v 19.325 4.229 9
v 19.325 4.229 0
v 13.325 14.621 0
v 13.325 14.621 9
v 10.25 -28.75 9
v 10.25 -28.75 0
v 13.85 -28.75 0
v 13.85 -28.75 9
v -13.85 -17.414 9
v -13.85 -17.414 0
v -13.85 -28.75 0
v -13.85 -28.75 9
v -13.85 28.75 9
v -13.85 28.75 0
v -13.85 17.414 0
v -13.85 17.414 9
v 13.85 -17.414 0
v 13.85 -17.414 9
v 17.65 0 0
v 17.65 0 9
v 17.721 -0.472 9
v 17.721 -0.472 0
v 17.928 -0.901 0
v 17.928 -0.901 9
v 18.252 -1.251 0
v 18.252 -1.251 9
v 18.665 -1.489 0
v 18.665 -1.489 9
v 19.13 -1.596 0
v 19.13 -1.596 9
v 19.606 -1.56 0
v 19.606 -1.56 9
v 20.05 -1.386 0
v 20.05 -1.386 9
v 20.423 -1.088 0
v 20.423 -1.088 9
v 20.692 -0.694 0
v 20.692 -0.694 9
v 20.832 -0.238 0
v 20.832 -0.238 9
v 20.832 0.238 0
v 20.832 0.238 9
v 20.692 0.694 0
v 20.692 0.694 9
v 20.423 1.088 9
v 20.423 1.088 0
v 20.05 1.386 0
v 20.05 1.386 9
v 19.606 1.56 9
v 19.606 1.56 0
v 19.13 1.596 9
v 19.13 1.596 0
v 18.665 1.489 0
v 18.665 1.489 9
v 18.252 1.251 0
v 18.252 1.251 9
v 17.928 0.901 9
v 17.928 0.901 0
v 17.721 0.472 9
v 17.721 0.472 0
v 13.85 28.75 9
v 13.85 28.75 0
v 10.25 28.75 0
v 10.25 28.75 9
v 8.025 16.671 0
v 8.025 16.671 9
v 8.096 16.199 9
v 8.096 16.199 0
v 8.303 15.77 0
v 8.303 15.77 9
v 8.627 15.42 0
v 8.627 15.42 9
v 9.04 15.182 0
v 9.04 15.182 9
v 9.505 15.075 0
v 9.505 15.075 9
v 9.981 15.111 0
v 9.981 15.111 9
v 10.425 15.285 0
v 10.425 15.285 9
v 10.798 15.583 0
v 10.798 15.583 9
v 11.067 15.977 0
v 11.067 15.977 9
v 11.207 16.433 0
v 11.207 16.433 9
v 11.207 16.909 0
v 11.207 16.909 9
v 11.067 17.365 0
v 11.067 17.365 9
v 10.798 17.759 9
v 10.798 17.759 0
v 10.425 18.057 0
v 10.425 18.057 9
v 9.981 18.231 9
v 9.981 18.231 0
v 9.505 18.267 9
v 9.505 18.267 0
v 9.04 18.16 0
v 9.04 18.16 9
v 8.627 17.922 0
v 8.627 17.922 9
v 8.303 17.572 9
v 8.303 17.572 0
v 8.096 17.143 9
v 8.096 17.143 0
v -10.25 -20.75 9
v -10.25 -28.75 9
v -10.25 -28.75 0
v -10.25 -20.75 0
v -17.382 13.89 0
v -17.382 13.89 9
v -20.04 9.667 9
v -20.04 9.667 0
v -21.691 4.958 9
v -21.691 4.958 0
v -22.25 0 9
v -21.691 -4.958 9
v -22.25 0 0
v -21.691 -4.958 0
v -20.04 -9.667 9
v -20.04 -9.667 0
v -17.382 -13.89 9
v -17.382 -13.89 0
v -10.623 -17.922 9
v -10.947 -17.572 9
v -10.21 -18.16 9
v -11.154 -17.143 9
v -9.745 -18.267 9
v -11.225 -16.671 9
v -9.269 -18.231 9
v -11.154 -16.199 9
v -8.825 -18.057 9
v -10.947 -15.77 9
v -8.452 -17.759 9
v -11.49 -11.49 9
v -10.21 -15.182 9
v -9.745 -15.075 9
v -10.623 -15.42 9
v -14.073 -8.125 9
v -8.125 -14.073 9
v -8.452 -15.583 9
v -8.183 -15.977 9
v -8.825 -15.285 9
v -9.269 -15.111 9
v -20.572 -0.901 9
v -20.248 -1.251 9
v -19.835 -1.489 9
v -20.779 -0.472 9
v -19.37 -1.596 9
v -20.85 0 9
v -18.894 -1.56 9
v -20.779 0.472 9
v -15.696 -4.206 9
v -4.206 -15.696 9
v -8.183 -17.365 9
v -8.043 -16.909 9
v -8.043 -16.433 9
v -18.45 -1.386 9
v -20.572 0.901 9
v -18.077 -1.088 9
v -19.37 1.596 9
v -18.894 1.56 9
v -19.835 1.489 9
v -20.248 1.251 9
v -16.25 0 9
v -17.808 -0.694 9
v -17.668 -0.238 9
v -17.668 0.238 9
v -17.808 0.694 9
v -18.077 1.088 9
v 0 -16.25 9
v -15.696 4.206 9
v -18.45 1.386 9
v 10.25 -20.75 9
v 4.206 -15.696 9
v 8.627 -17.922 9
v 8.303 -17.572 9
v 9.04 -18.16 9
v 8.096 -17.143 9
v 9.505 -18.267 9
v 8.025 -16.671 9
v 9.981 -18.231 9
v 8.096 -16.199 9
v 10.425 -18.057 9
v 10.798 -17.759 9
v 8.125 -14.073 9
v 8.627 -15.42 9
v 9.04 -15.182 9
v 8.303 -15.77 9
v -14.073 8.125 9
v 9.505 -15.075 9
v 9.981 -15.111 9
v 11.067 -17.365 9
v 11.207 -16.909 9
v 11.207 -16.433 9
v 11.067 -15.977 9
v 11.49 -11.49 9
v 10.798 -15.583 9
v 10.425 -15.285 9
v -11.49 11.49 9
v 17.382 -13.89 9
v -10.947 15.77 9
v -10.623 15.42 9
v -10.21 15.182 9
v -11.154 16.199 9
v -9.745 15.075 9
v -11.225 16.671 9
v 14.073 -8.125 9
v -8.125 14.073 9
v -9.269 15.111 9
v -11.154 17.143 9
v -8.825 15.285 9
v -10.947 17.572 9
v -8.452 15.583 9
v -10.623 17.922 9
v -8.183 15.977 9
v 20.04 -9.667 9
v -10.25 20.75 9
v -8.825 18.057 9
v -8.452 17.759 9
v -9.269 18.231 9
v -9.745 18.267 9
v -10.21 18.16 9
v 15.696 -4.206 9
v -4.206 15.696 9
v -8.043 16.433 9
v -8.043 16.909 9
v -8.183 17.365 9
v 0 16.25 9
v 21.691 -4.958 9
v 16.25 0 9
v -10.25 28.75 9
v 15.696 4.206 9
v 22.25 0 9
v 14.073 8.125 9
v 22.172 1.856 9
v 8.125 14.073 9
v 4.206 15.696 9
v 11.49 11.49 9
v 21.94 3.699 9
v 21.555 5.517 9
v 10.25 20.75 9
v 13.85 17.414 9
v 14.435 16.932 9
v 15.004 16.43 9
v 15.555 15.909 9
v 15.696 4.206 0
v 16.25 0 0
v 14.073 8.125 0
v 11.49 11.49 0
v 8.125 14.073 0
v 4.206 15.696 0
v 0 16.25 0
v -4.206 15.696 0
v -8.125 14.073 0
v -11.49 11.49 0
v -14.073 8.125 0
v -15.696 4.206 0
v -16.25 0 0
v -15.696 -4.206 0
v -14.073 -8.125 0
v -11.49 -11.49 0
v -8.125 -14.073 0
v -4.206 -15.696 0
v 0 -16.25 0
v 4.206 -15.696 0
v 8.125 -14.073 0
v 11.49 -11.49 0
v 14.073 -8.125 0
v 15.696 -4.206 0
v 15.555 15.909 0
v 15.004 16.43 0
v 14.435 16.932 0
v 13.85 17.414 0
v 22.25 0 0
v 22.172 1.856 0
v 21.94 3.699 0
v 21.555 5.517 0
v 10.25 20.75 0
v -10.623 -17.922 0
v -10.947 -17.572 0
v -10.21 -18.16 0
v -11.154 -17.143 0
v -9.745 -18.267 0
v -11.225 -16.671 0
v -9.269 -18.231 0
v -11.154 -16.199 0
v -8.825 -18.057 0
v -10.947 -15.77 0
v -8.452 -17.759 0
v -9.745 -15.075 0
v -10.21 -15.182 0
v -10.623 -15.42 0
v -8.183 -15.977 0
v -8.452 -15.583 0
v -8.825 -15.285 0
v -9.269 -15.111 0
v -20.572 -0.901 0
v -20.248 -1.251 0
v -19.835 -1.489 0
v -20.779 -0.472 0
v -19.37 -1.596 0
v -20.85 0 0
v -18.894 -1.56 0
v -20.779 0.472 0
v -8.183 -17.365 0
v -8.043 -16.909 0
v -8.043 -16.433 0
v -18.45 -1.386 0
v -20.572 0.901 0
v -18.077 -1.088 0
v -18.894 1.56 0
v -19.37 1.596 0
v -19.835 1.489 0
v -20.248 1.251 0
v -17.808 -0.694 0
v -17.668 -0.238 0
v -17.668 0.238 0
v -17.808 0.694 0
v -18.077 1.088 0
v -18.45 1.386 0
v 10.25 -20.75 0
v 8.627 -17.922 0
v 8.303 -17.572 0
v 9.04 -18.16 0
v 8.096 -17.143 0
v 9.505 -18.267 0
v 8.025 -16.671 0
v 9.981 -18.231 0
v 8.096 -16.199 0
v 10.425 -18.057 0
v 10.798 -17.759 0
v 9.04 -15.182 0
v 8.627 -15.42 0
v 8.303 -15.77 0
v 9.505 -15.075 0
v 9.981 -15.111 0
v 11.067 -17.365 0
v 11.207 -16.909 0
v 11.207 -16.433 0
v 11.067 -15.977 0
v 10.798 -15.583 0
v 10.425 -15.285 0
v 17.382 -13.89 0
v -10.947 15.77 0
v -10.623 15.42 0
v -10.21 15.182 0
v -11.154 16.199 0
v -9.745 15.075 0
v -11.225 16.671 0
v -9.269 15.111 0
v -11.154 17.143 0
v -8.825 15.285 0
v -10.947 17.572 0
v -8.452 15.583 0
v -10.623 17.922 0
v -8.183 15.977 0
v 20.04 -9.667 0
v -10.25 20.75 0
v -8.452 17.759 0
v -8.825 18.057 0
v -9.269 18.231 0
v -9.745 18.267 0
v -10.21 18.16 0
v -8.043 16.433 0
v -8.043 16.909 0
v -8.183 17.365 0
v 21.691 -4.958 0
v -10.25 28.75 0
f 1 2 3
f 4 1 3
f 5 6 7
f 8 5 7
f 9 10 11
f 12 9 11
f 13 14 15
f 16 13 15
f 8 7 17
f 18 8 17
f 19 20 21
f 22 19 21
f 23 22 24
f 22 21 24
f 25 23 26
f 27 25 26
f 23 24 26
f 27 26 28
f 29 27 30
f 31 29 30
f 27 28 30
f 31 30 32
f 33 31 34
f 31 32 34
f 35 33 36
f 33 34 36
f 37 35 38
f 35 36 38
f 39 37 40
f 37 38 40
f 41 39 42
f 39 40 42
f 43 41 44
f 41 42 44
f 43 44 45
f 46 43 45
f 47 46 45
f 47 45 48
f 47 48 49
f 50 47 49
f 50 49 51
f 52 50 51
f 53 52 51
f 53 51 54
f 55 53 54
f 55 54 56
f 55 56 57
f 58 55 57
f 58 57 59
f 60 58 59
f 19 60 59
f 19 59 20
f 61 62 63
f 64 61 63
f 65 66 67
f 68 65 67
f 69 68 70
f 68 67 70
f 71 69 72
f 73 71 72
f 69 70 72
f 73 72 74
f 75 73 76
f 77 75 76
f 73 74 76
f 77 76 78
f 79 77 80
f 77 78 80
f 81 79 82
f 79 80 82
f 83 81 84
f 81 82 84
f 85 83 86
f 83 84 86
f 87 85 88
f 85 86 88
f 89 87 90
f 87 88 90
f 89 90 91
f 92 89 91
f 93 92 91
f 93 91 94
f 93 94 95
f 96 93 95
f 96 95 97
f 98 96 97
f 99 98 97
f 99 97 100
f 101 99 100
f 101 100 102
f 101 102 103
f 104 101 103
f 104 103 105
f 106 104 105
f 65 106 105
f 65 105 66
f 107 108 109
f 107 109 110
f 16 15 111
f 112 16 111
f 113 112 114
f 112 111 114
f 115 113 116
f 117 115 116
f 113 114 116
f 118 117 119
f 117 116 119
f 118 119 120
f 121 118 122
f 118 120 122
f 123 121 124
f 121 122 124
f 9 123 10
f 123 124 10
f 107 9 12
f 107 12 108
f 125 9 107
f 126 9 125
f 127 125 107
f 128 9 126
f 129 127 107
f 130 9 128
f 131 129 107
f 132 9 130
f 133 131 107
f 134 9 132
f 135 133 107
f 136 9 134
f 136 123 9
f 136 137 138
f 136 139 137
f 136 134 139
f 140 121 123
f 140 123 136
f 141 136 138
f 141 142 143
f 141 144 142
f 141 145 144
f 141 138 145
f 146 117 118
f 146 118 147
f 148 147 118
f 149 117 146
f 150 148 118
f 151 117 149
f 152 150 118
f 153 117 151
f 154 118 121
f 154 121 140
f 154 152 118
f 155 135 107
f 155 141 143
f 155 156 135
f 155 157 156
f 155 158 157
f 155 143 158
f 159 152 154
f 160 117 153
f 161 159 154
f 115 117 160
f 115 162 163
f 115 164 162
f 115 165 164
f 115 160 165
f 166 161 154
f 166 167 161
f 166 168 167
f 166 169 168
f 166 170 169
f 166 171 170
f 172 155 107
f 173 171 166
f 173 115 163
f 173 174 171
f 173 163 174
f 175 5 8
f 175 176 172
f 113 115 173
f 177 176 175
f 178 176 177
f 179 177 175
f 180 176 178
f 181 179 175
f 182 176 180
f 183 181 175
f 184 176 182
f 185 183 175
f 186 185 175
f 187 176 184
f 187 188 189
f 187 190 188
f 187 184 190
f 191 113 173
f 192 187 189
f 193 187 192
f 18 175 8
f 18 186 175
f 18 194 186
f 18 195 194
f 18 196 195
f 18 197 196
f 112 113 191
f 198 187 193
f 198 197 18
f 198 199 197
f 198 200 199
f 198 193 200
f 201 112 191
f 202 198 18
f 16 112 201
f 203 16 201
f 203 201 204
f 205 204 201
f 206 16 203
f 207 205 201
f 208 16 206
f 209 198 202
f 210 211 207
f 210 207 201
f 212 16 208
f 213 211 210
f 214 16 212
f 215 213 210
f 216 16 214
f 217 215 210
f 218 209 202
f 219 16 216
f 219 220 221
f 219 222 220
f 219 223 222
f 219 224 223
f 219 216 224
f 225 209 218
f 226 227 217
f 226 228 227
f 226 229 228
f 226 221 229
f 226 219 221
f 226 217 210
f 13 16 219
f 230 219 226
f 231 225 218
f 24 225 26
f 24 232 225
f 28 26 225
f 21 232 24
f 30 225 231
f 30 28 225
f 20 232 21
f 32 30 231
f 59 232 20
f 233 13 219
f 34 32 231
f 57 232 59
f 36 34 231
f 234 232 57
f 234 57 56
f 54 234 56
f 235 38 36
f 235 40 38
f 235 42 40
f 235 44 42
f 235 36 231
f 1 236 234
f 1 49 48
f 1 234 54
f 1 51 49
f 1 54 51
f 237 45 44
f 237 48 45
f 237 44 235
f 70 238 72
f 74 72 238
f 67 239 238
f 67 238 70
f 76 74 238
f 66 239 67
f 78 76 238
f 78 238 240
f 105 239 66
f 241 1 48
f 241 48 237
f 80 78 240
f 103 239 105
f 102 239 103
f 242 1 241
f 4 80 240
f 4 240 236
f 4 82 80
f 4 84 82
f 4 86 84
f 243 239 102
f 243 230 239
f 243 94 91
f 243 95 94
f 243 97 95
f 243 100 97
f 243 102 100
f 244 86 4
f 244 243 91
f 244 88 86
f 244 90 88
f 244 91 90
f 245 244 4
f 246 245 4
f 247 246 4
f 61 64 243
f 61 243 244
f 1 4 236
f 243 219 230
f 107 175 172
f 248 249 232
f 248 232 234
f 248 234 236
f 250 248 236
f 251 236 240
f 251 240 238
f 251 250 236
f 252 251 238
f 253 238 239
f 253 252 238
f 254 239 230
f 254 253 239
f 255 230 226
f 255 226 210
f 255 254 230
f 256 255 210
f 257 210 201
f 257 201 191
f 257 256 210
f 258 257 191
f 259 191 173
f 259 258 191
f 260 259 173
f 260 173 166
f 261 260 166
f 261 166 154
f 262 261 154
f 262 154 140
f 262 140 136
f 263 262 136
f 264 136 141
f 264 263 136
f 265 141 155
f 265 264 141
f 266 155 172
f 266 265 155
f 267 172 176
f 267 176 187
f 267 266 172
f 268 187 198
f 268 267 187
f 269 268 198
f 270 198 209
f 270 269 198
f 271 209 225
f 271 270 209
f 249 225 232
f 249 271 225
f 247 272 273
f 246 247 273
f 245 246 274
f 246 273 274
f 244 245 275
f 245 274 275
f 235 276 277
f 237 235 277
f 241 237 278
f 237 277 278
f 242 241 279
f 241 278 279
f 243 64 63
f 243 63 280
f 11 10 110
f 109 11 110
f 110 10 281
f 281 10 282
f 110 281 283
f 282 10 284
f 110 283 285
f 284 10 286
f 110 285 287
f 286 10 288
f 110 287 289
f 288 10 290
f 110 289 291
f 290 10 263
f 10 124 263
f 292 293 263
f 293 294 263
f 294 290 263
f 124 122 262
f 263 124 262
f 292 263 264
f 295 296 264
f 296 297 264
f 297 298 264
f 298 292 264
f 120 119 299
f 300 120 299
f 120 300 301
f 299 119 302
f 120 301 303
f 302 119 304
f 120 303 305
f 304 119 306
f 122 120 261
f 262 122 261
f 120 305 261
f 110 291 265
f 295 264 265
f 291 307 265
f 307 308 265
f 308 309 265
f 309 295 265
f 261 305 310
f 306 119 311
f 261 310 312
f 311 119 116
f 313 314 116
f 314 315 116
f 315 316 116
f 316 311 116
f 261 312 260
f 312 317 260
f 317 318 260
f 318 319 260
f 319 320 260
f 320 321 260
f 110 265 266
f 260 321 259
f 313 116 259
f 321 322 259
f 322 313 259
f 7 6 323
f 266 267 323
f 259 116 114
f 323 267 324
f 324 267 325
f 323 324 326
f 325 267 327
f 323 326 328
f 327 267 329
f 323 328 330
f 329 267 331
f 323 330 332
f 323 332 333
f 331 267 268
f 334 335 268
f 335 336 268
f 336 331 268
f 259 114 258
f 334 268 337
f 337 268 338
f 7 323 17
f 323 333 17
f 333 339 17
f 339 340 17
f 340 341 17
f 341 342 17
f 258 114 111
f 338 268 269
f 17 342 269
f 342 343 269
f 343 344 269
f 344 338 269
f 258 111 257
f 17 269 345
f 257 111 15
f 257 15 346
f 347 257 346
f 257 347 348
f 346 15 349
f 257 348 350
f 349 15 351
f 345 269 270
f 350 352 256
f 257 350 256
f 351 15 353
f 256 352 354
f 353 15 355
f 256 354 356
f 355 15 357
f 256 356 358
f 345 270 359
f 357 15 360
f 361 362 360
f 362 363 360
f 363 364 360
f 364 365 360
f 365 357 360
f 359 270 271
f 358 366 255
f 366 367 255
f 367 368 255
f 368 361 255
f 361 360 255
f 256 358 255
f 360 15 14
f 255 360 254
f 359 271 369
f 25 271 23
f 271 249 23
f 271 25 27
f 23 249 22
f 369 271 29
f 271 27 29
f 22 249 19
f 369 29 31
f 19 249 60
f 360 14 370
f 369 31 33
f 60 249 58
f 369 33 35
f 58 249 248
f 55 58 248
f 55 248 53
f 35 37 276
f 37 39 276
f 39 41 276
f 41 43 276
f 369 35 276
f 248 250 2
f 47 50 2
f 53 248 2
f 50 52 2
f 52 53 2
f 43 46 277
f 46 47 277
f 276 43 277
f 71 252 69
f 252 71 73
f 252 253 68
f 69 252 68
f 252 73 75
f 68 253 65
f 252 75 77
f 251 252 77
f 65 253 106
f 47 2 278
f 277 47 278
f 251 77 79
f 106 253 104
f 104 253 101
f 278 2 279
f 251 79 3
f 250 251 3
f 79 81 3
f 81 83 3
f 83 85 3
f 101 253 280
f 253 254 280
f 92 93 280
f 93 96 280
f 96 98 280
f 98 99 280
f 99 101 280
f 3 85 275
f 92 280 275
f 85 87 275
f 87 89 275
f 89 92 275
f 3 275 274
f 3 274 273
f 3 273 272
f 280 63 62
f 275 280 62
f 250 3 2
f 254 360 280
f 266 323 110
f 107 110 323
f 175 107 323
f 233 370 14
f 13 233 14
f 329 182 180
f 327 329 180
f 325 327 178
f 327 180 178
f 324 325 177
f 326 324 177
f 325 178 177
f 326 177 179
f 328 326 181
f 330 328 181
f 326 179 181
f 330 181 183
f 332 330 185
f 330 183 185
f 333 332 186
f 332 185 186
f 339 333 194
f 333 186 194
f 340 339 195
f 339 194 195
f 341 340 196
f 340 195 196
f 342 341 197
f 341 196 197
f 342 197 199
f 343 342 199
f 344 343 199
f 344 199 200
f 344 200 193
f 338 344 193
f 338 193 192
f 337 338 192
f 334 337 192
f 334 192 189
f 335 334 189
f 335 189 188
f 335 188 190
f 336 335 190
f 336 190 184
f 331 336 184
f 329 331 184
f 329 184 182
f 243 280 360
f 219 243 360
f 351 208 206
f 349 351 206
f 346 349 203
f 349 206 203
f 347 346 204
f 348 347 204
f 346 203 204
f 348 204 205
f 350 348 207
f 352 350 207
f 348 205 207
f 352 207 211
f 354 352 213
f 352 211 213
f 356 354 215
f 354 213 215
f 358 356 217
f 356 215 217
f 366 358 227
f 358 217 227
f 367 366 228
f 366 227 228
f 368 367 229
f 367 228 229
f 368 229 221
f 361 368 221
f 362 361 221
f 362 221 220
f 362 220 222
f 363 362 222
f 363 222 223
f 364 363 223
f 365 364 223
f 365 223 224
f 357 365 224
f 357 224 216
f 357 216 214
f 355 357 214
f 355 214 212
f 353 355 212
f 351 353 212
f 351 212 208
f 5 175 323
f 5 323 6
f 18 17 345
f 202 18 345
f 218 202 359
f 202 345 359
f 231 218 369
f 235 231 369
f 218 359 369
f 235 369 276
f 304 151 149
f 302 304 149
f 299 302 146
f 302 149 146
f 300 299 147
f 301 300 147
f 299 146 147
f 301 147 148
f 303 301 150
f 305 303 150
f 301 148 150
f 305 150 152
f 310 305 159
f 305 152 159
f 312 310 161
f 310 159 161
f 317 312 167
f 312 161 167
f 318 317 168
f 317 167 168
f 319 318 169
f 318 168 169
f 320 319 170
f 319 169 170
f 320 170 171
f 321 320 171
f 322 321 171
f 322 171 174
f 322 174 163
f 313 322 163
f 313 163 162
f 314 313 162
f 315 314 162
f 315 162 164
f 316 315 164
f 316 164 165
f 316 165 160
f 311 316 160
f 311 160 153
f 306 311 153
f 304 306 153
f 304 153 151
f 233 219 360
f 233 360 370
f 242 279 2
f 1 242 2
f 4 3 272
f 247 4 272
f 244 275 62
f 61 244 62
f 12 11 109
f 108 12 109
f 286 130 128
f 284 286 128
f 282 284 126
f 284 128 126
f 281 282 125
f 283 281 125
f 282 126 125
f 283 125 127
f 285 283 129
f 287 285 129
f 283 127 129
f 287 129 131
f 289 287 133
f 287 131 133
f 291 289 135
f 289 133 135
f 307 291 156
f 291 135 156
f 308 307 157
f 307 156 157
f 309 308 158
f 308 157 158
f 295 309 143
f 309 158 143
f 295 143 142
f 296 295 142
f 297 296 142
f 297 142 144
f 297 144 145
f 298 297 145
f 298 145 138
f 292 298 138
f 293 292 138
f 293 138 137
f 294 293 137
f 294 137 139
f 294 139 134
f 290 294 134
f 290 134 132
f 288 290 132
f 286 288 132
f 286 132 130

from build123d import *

# Parameters (mm, degrees)
F0_R     = 16.25
F1_DEPTH = 9
F2_D     = 3.2
F2_DEPTH = 40


with BuildPart() as f1:
    # F0 (on Top) → F1 (new body)
    with BuildSketch(Plane.XY):
        with BuildLine():
            ThreePointArc((13.85, -17.413788), (20.040272, -9.666954), (22.25, 0))
            ThreePointArc((22.25, 0), (22.075626, 2.780148), (21.555238, 5.51672))
            Line((21.555238, 5.51672), (19.324579, 4.228848))
            Line((19.324579, 4.228848), (13.324579, 14.621152))
            Line((13.324579, 14.621152), (15.555238, 15.909024))
            ThreePointArc((15.555238, 15.909024), (14.721858, 16.683207), (13.85, 17.413788))
            Line((13.85, 17.413788), (-13.85, 17.413788))
            ThreePointArc((-13.85, 17.413788), (-22.25, 0), (-13.85, -17.413788))
            Line((-13.85, -17.413788), (13.85, -17.413788))
        make_face()
        Circle(F0_R, mode=Mode.SUBTRACT)
        with BuildLine():
            ThreePointArc((-8.031189, -20.75), (-11.067032, -19.302417), (-13.85, -17.413788))
            Line((-13.85, -17.413788), (-13.85, -28.75))
            Line((-13.85, -28.75), (-10.25, -28.75))
            Line((-10.25, -28.75), (-10.25, -20.75))
            Line((-10.25, -20.75), (-8.031189, -20.75))
        make_face()
        with BuildLine():
            ThreePointArc((8.031189, -20.75), (11.067032, -19.302417), (13.85, -17.413788))
            Line((13.85, -17.413788), (-13.85, -17.413788))
            ThreePointArc((-13.85, -17.413788), (-11.067032, -19.302417), (-8.031189, -20.75))
            Line((-8.031189, -20.75), (8.031189, -20.75))
        make_face()
        with BuildLine():
            Line((13.85, -28.75), (13.85, -17.413788))
            ThreePointArc((13.85, -17.413788), (11.067032, -19.302417), (8.031189, -20.75))
            Line((8.031189, -20.75), (10.25, -20.75))
            Line((10.25, -20.75), (10.25, -28.75))
            Line((10.25, -28.75), (13.85, -28.75))
        make_face()
        with BuildLine():
            ThreePointArc((8.031189, 20.75), (11.067032, 19.302417), (13.85, 17.413788))
            Line((13.85, 17.413788), (13.85, 28.75))
            Line((13.85, 28.75), (10.25, 28.75))
            Line((10.25, 28.75), (10.25, 20.75))
            Line((10.25, 20.75), (8.031189, 20.75))
        make_face()
        with BuildLine():
            Line((-13.85, 17.413788), (13.85, 17.413788))
            ThreePointArc((13.85, 17.413788), (11.067032, 19.302417), (8.031189, 20.75))
            Line((8.031189, 20.75), (-8.031189, 20.75))
            ThreePointArc((-8.031189, 20.75), (-11.067032, 19.302417), (-13.85, 17.413788))
        make_face()
        with BuildLine():
            Line((-13.85, 28.75), (-13.85, 17.413788))
            ThreePointArc((-13.85, 17.413788), (-11.067032, 19.302417), (-8.031189, 20.75))
            Line((-8.031189, 20.75), (-10.25, 20.75))
            Line((-10.25, 20.75), (-10.25, 28.75))
            Line((-10.25, 28.75), (-13.85, 28.75))
        make_face()
    extrude(amount=F1_DEPTH)

    # F2
    with Locations(Plane(origin=(0, 0, 0), x_dir=(1, 0, 0), z_dir=(0, 0, -1))):
        with Locations((-9.625, -16.670989), (9.625, -16.670989), (19.25, 0), (9.625, 16.670989), (-9.625, 16.670989), (-19.25, 0)):
            Hole(F2_D / 2, depth=F2_DEPTH)


solid = f1.part
